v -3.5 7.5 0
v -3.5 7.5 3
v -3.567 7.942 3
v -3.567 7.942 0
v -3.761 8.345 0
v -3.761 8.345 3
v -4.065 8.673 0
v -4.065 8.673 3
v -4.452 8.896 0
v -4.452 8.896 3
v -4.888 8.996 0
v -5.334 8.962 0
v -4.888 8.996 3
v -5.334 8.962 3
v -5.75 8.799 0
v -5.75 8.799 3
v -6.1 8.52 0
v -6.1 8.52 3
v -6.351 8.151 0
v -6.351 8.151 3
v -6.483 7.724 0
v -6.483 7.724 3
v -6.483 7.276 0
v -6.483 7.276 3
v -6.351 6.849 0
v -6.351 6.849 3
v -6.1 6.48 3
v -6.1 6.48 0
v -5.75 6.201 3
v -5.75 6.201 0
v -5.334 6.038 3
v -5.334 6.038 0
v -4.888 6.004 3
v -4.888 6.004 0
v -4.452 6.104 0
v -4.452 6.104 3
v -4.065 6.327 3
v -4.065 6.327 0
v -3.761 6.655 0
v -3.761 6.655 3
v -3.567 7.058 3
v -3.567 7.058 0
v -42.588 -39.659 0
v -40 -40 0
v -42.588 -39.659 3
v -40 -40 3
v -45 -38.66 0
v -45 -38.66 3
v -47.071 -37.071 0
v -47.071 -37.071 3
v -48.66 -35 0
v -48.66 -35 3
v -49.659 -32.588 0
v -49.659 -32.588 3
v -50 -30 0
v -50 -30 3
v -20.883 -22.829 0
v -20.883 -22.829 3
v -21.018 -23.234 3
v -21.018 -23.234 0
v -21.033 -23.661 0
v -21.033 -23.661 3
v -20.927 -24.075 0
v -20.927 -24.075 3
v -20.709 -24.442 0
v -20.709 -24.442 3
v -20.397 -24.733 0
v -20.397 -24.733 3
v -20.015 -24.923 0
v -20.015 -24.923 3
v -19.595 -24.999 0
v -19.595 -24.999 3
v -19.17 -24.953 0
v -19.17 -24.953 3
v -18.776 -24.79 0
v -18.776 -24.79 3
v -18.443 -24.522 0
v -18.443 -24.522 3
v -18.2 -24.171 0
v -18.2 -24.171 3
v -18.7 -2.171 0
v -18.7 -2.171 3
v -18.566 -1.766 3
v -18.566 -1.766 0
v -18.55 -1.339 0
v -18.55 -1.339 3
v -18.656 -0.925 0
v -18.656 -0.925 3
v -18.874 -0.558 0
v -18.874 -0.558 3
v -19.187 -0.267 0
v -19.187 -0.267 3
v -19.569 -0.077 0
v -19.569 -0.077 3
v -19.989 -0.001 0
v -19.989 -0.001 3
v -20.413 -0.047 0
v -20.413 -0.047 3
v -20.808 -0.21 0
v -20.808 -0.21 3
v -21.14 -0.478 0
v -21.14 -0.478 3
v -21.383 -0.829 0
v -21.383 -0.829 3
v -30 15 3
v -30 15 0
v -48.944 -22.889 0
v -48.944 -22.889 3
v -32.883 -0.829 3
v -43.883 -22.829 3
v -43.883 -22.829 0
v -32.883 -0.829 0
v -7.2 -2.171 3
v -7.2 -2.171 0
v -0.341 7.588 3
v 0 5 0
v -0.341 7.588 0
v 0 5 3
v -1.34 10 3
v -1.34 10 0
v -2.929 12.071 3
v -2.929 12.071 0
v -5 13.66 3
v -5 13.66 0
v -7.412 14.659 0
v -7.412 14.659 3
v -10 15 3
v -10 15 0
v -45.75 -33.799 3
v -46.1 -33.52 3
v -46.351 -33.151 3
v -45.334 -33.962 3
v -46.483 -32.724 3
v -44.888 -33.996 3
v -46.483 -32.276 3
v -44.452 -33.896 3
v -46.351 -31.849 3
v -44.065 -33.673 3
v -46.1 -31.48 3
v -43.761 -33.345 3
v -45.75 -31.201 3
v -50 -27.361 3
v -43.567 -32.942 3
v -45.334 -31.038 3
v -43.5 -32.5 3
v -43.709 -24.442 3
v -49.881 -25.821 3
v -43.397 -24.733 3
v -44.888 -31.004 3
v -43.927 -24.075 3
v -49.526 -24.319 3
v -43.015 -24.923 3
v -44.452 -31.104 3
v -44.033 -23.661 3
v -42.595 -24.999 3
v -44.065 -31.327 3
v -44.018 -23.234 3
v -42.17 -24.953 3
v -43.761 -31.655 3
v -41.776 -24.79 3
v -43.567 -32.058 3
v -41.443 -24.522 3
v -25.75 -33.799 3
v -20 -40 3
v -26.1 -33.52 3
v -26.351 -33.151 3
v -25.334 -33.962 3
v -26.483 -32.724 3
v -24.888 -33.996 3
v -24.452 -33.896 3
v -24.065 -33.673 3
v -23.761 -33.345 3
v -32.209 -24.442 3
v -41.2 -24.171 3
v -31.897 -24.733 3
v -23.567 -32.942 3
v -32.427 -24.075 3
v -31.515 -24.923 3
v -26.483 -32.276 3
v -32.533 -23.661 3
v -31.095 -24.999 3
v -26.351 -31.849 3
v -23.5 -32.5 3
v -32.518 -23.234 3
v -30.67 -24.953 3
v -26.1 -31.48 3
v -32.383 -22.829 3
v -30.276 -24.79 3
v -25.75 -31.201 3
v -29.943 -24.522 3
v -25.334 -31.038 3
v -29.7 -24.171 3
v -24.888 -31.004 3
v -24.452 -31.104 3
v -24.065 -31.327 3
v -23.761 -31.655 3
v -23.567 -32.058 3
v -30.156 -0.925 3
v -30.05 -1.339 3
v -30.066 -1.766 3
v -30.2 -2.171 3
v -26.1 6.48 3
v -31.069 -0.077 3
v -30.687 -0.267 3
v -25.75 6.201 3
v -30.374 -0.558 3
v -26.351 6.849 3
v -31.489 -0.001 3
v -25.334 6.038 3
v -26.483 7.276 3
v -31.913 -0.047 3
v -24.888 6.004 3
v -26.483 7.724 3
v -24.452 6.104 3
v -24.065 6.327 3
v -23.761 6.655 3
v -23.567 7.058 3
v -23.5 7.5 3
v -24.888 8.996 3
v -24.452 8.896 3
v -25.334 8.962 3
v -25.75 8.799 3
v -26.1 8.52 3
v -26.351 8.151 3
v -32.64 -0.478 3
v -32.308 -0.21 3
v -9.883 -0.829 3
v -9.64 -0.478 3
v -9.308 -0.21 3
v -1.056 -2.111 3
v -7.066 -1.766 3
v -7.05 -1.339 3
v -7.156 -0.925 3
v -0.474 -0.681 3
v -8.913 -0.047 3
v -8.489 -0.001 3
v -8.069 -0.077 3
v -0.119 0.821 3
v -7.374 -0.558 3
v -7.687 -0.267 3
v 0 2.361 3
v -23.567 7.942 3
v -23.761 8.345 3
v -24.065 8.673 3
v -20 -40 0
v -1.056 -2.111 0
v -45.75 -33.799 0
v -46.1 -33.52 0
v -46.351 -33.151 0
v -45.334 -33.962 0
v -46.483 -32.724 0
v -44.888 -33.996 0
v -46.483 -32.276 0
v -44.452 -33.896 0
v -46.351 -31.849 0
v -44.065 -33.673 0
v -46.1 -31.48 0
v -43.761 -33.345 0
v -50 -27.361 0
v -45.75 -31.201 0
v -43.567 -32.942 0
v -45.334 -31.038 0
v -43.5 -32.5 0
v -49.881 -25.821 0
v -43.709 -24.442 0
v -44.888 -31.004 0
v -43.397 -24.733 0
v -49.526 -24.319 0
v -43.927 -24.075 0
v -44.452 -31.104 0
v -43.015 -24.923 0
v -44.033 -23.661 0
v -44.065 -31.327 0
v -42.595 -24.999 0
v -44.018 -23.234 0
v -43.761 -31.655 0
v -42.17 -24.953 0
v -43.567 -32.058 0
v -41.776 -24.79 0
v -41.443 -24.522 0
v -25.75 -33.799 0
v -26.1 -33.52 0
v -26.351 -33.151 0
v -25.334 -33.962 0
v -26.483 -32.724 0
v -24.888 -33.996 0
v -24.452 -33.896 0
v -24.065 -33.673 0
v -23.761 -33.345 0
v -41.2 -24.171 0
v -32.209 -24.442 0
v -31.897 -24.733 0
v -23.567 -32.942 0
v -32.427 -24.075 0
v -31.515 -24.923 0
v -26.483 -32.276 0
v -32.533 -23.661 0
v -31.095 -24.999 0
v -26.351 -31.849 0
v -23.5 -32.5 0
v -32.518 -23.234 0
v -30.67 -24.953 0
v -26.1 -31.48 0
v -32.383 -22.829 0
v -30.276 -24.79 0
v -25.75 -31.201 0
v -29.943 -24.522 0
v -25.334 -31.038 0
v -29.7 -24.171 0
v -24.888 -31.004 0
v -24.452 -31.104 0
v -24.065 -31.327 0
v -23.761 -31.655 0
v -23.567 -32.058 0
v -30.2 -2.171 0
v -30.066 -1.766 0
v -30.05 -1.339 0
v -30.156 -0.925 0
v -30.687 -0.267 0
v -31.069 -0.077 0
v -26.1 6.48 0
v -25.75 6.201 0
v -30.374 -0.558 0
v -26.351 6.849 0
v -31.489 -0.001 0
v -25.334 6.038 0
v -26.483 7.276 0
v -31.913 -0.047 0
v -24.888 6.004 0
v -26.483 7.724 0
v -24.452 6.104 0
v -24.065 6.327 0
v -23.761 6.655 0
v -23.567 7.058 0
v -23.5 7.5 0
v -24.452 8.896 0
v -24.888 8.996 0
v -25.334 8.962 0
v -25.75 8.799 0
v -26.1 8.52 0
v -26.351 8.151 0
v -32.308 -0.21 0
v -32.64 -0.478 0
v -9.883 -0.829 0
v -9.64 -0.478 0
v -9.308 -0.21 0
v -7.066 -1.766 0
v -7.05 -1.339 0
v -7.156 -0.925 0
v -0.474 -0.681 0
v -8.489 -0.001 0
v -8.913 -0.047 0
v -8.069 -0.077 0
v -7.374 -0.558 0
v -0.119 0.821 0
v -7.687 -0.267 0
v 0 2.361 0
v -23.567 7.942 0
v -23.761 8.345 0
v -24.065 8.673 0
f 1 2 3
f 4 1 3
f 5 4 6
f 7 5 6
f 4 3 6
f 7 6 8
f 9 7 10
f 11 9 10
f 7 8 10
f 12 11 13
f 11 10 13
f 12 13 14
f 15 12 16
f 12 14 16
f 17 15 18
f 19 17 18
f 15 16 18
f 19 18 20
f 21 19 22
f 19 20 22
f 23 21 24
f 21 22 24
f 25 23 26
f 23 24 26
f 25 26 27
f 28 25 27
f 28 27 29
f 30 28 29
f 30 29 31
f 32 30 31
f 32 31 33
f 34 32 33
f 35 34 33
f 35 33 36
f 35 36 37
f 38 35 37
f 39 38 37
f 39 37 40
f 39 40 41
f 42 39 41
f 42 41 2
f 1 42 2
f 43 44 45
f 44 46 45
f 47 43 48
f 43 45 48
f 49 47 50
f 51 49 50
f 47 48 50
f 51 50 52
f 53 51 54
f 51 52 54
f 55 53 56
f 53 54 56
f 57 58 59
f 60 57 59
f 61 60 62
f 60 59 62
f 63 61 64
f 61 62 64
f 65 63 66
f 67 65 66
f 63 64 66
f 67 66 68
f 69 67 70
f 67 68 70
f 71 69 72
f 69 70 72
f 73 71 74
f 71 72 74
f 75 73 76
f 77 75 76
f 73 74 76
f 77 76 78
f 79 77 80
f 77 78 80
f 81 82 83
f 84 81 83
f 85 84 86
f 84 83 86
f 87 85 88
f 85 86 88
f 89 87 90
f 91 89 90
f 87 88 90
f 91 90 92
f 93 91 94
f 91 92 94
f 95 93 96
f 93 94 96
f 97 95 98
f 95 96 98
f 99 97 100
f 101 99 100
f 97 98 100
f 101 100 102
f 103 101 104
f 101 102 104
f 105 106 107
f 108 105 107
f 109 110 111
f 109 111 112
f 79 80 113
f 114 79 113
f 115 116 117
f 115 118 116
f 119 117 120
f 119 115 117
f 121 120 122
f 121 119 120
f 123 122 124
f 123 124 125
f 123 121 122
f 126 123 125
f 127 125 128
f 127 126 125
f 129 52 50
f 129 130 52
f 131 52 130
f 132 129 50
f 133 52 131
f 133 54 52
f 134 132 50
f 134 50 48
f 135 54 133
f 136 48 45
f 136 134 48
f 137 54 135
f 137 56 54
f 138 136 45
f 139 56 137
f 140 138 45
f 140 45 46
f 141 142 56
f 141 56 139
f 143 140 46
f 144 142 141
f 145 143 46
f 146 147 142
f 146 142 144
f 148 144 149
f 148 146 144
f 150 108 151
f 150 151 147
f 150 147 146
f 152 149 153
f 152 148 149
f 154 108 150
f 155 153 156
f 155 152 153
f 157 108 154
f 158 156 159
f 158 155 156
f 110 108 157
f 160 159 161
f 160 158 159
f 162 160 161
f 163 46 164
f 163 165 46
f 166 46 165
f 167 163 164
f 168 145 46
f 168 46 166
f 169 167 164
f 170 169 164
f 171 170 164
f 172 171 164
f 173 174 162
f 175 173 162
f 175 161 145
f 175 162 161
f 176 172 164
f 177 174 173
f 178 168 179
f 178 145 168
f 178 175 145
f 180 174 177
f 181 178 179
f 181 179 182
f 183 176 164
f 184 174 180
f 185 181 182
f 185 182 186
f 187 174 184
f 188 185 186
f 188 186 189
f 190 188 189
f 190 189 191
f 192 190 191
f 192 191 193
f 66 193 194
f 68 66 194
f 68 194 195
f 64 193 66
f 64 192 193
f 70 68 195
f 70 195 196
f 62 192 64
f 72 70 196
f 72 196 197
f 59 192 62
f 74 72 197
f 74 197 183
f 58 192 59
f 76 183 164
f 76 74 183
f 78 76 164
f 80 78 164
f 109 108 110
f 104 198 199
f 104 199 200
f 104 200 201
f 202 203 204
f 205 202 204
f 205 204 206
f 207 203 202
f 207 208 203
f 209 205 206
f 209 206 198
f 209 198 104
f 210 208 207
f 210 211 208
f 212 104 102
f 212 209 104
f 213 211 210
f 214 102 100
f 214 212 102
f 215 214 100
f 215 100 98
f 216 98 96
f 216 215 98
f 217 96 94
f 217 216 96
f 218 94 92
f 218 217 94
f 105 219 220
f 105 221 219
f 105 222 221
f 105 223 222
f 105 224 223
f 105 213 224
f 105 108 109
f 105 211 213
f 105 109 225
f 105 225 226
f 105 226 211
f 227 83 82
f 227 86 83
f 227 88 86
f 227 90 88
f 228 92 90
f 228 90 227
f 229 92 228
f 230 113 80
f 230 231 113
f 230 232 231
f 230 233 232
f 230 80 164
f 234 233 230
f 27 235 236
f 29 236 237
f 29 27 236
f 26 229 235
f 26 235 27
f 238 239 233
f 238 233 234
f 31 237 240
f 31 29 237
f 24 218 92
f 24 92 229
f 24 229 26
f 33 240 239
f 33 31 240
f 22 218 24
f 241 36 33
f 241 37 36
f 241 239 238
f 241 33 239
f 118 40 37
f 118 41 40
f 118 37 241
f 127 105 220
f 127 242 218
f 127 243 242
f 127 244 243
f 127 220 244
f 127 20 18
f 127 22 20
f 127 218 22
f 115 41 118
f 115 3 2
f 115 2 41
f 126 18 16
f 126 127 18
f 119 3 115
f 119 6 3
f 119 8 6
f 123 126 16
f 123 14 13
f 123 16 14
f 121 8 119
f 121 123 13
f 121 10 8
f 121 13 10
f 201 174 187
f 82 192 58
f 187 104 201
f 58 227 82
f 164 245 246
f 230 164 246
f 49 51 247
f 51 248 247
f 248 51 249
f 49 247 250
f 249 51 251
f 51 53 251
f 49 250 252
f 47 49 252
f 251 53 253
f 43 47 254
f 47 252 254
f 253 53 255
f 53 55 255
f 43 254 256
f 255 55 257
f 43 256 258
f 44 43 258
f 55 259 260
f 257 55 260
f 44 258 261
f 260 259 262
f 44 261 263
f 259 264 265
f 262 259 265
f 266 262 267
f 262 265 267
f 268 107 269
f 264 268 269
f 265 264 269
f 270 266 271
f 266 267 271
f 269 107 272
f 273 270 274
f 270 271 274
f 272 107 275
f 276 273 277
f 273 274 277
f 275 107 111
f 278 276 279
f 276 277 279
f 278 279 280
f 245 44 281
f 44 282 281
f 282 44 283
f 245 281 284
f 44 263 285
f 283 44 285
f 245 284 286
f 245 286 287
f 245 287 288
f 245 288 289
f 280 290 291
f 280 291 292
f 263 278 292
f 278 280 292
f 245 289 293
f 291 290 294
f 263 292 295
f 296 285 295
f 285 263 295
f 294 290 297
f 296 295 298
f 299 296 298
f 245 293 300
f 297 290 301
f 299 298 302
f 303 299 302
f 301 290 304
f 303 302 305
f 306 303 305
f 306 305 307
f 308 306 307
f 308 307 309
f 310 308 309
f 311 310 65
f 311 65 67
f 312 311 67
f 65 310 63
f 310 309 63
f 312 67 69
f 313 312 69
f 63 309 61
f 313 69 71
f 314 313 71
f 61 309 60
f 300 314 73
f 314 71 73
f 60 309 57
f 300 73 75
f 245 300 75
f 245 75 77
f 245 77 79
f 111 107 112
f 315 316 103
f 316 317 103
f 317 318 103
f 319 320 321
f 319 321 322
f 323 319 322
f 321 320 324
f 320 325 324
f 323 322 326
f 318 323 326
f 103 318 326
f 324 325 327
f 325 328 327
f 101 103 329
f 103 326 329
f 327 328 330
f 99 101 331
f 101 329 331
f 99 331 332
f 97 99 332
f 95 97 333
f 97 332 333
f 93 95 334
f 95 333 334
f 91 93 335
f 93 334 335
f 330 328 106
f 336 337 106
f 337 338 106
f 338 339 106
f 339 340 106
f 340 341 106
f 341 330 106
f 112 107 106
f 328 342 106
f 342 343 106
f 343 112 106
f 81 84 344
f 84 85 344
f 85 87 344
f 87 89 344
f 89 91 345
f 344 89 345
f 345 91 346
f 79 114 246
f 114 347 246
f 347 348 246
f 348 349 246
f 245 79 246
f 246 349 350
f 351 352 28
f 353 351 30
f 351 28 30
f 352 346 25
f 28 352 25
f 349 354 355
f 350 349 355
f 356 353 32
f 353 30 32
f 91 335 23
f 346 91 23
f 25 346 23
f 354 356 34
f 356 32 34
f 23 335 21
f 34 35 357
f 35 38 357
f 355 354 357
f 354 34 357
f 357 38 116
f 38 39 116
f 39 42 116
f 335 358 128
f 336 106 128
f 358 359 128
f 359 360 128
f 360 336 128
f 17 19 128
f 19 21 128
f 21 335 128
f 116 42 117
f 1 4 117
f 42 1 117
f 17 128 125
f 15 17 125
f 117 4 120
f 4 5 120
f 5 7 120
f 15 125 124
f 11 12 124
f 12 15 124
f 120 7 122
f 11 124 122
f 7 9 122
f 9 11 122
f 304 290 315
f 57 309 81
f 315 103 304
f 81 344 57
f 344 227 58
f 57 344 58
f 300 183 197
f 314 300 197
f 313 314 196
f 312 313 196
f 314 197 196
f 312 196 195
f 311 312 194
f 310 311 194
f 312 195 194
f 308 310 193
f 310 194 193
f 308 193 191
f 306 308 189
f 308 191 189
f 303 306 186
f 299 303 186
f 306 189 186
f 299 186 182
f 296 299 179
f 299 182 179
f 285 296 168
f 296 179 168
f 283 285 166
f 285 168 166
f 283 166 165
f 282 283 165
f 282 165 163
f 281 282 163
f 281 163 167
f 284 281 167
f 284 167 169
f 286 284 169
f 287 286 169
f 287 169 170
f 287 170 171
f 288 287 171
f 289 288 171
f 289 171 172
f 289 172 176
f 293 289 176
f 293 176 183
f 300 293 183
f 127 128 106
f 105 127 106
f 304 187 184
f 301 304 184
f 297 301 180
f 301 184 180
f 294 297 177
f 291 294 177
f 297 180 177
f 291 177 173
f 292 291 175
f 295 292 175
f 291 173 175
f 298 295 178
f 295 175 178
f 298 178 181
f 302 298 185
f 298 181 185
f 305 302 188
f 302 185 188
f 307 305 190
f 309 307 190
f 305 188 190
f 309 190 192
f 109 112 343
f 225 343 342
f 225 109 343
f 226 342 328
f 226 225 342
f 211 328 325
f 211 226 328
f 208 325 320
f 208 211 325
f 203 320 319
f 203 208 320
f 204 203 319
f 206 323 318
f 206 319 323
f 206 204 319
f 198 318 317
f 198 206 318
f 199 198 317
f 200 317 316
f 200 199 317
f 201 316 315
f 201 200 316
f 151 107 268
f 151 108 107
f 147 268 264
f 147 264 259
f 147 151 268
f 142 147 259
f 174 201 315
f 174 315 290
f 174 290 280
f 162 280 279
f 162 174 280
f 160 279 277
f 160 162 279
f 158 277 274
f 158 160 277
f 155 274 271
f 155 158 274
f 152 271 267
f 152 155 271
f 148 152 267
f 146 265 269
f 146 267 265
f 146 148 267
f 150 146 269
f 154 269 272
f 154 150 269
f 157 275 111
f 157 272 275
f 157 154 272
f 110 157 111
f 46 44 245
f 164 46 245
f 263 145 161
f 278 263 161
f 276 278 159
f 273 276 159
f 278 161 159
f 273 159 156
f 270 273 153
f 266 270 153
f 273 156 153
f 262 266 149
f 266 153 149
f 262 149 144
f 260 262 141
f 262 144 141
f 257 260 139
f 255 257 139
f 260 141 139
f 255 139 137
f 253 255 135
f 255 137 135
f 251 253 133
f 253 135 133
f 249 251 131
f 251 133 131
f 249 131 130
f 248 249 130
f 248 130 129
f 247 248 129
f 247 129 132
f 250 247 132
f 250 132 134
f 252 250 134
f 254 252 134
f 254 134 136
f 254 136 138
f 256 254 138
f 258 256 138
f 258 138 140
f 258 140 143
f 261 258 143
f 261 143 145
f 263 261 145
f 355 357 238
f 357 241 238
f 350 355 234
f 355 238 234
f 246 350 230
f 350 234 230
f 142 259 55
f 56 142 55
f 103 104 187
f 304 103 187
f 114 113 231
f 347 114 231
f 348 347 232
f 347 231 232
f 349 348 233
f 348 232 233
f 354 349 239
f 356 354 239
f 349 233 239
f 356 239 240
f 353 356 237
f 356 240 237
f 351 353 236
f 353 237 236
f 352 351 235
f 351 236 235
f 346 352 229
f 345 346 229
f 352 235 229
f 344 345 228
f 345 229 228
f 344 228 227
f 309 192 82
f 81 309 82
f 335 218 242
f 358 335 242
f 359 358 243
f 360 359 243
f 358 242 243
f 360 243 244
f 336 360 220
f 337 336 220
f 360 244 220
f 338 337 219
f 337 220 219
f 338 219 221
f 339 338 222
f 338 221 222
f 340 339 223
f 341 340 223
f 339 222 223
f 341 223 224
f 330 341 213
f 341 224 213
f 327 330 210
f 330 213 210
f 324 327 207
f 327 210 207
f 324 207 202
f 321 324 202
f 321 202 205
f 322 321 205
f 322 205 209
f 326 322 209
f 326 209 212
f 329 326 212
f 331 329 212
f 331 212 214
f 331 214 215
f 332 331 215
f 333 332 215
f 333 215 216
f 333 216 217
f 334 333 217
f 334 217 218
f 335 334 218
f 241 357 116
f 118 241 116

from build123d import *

# Parameters (mm, degrees)
EXTRUDE_1_DEPTH     = 3
SKETCH_3_R          = 1.5
CUT_EXTRUDE_1_DEPTH = 65.101482042
FILLET_2_R          = 10
FILLET_3_R          = 10
CUT_EXTRUDE_3_DEPTH = 65.101482042


with BuildPart() as part:
    # 草图2 → 凸台-拉伸1 (new body)
    with BuildSketch(Plane.XY):
        Polygon((0, 0), (0, 15), (-30, 15), (-50, -25), (-50, -40), (-20, -40), align=None)
    extrude(amount=EXTRUDE_1_DEPTH)

    # 草图3 → 切除-拉伸1 (cut, through all)
    with BuildSketch(Plane.XY.offset(3)):
        with Locations((-5, 7.5)):
            Circle(SKETCH_3_R)
        with Locations((-25, 7.5)):
            Circle(SKETCH_3_R)
        with Locations((-45, -32.5)):
            Circle(SKETCH_3_R)
        with Locations((-25, -32.5)):
            Circle(SKETCH_3_R)
    extrude(amount=-CUT_EXTRUDE_1_DEPTH, mode=Mode.SUBTRACT)

    # 圆角2
    fillet_2_edges = [part.edges().sort_by_distance(p)[0] for p in [
        (-50, -25, 1.5),
        (0, 0, 1.5),
    ]]
    fillet(fillet_2_edges, radius=FILLET_2_R)

    # 圆角3
    fillet_3_edges = [part.edges().sort_by_distance(p)[0] for p in [
        (-50, -40, 1.5),
        (0, 15, 1.5),
    ]]
    fillet(fillet_3_edges, radius=FILLET_3_R)

    # 草图7 → 切除-拉伸3 (cut, through all)
    with BuildSketch(Plane.XY.offset(3)):
        with BuildLine():
            Line((-43.883436854, -22.829179607), (-32.883436854, -0.829179607))
            ThreePointArc((-32.883436854, -0.829179607), (-30.870975674, -0.158359214), (-30.200155281, -2.170820393))
            Line((-30.200155281, -2.170820393), (-41.200155281, -24.170820393))
            ThreePointArc((-41.200155281, -24.170820393), (-43.212616461, -24.841640786), (-43.883436854, -22.829179607))
        make_face()
        with BuildLine():
            Line((-29.700155281, -24.170820393), (-18.700155281, -2.170820393))
            ThreePointArc((-18.700155281, -2.170820393), (-19.370975674, -0.158359214), (-21.383436854, -0.829179607))
            Line((-21.383436854, -0.829179607), (-32.383436854, -22.829179607))
            ThreePointArc((-32.383436854, -22.829179607), (-31.712616461, -24.841640786), (-29.700155281, -24.170820393))
        make_face()
        with BuildLine():
            Line((-18.200155281, -24.170820393), (-7.200155281, -2.170820393))
            ThreePointArc((-7.200155281, -2.170820393), (-7.870975674, -0.158359214), (-9.883436854, -0.829179607))
            Line((-9.883436854, -0.829179607), (-20.883436854, -22.829179607))
            ThreePointArc((-20.883436854, -22.829179607), (-20.212616461, -24.841640786), (-18.200155281, -24.170820393))
        make_face()
    extrude(amount=-CUT_EXTRUDE_3_DEPTH, mode=Mode.SUBTRACT)


solid = part.part
